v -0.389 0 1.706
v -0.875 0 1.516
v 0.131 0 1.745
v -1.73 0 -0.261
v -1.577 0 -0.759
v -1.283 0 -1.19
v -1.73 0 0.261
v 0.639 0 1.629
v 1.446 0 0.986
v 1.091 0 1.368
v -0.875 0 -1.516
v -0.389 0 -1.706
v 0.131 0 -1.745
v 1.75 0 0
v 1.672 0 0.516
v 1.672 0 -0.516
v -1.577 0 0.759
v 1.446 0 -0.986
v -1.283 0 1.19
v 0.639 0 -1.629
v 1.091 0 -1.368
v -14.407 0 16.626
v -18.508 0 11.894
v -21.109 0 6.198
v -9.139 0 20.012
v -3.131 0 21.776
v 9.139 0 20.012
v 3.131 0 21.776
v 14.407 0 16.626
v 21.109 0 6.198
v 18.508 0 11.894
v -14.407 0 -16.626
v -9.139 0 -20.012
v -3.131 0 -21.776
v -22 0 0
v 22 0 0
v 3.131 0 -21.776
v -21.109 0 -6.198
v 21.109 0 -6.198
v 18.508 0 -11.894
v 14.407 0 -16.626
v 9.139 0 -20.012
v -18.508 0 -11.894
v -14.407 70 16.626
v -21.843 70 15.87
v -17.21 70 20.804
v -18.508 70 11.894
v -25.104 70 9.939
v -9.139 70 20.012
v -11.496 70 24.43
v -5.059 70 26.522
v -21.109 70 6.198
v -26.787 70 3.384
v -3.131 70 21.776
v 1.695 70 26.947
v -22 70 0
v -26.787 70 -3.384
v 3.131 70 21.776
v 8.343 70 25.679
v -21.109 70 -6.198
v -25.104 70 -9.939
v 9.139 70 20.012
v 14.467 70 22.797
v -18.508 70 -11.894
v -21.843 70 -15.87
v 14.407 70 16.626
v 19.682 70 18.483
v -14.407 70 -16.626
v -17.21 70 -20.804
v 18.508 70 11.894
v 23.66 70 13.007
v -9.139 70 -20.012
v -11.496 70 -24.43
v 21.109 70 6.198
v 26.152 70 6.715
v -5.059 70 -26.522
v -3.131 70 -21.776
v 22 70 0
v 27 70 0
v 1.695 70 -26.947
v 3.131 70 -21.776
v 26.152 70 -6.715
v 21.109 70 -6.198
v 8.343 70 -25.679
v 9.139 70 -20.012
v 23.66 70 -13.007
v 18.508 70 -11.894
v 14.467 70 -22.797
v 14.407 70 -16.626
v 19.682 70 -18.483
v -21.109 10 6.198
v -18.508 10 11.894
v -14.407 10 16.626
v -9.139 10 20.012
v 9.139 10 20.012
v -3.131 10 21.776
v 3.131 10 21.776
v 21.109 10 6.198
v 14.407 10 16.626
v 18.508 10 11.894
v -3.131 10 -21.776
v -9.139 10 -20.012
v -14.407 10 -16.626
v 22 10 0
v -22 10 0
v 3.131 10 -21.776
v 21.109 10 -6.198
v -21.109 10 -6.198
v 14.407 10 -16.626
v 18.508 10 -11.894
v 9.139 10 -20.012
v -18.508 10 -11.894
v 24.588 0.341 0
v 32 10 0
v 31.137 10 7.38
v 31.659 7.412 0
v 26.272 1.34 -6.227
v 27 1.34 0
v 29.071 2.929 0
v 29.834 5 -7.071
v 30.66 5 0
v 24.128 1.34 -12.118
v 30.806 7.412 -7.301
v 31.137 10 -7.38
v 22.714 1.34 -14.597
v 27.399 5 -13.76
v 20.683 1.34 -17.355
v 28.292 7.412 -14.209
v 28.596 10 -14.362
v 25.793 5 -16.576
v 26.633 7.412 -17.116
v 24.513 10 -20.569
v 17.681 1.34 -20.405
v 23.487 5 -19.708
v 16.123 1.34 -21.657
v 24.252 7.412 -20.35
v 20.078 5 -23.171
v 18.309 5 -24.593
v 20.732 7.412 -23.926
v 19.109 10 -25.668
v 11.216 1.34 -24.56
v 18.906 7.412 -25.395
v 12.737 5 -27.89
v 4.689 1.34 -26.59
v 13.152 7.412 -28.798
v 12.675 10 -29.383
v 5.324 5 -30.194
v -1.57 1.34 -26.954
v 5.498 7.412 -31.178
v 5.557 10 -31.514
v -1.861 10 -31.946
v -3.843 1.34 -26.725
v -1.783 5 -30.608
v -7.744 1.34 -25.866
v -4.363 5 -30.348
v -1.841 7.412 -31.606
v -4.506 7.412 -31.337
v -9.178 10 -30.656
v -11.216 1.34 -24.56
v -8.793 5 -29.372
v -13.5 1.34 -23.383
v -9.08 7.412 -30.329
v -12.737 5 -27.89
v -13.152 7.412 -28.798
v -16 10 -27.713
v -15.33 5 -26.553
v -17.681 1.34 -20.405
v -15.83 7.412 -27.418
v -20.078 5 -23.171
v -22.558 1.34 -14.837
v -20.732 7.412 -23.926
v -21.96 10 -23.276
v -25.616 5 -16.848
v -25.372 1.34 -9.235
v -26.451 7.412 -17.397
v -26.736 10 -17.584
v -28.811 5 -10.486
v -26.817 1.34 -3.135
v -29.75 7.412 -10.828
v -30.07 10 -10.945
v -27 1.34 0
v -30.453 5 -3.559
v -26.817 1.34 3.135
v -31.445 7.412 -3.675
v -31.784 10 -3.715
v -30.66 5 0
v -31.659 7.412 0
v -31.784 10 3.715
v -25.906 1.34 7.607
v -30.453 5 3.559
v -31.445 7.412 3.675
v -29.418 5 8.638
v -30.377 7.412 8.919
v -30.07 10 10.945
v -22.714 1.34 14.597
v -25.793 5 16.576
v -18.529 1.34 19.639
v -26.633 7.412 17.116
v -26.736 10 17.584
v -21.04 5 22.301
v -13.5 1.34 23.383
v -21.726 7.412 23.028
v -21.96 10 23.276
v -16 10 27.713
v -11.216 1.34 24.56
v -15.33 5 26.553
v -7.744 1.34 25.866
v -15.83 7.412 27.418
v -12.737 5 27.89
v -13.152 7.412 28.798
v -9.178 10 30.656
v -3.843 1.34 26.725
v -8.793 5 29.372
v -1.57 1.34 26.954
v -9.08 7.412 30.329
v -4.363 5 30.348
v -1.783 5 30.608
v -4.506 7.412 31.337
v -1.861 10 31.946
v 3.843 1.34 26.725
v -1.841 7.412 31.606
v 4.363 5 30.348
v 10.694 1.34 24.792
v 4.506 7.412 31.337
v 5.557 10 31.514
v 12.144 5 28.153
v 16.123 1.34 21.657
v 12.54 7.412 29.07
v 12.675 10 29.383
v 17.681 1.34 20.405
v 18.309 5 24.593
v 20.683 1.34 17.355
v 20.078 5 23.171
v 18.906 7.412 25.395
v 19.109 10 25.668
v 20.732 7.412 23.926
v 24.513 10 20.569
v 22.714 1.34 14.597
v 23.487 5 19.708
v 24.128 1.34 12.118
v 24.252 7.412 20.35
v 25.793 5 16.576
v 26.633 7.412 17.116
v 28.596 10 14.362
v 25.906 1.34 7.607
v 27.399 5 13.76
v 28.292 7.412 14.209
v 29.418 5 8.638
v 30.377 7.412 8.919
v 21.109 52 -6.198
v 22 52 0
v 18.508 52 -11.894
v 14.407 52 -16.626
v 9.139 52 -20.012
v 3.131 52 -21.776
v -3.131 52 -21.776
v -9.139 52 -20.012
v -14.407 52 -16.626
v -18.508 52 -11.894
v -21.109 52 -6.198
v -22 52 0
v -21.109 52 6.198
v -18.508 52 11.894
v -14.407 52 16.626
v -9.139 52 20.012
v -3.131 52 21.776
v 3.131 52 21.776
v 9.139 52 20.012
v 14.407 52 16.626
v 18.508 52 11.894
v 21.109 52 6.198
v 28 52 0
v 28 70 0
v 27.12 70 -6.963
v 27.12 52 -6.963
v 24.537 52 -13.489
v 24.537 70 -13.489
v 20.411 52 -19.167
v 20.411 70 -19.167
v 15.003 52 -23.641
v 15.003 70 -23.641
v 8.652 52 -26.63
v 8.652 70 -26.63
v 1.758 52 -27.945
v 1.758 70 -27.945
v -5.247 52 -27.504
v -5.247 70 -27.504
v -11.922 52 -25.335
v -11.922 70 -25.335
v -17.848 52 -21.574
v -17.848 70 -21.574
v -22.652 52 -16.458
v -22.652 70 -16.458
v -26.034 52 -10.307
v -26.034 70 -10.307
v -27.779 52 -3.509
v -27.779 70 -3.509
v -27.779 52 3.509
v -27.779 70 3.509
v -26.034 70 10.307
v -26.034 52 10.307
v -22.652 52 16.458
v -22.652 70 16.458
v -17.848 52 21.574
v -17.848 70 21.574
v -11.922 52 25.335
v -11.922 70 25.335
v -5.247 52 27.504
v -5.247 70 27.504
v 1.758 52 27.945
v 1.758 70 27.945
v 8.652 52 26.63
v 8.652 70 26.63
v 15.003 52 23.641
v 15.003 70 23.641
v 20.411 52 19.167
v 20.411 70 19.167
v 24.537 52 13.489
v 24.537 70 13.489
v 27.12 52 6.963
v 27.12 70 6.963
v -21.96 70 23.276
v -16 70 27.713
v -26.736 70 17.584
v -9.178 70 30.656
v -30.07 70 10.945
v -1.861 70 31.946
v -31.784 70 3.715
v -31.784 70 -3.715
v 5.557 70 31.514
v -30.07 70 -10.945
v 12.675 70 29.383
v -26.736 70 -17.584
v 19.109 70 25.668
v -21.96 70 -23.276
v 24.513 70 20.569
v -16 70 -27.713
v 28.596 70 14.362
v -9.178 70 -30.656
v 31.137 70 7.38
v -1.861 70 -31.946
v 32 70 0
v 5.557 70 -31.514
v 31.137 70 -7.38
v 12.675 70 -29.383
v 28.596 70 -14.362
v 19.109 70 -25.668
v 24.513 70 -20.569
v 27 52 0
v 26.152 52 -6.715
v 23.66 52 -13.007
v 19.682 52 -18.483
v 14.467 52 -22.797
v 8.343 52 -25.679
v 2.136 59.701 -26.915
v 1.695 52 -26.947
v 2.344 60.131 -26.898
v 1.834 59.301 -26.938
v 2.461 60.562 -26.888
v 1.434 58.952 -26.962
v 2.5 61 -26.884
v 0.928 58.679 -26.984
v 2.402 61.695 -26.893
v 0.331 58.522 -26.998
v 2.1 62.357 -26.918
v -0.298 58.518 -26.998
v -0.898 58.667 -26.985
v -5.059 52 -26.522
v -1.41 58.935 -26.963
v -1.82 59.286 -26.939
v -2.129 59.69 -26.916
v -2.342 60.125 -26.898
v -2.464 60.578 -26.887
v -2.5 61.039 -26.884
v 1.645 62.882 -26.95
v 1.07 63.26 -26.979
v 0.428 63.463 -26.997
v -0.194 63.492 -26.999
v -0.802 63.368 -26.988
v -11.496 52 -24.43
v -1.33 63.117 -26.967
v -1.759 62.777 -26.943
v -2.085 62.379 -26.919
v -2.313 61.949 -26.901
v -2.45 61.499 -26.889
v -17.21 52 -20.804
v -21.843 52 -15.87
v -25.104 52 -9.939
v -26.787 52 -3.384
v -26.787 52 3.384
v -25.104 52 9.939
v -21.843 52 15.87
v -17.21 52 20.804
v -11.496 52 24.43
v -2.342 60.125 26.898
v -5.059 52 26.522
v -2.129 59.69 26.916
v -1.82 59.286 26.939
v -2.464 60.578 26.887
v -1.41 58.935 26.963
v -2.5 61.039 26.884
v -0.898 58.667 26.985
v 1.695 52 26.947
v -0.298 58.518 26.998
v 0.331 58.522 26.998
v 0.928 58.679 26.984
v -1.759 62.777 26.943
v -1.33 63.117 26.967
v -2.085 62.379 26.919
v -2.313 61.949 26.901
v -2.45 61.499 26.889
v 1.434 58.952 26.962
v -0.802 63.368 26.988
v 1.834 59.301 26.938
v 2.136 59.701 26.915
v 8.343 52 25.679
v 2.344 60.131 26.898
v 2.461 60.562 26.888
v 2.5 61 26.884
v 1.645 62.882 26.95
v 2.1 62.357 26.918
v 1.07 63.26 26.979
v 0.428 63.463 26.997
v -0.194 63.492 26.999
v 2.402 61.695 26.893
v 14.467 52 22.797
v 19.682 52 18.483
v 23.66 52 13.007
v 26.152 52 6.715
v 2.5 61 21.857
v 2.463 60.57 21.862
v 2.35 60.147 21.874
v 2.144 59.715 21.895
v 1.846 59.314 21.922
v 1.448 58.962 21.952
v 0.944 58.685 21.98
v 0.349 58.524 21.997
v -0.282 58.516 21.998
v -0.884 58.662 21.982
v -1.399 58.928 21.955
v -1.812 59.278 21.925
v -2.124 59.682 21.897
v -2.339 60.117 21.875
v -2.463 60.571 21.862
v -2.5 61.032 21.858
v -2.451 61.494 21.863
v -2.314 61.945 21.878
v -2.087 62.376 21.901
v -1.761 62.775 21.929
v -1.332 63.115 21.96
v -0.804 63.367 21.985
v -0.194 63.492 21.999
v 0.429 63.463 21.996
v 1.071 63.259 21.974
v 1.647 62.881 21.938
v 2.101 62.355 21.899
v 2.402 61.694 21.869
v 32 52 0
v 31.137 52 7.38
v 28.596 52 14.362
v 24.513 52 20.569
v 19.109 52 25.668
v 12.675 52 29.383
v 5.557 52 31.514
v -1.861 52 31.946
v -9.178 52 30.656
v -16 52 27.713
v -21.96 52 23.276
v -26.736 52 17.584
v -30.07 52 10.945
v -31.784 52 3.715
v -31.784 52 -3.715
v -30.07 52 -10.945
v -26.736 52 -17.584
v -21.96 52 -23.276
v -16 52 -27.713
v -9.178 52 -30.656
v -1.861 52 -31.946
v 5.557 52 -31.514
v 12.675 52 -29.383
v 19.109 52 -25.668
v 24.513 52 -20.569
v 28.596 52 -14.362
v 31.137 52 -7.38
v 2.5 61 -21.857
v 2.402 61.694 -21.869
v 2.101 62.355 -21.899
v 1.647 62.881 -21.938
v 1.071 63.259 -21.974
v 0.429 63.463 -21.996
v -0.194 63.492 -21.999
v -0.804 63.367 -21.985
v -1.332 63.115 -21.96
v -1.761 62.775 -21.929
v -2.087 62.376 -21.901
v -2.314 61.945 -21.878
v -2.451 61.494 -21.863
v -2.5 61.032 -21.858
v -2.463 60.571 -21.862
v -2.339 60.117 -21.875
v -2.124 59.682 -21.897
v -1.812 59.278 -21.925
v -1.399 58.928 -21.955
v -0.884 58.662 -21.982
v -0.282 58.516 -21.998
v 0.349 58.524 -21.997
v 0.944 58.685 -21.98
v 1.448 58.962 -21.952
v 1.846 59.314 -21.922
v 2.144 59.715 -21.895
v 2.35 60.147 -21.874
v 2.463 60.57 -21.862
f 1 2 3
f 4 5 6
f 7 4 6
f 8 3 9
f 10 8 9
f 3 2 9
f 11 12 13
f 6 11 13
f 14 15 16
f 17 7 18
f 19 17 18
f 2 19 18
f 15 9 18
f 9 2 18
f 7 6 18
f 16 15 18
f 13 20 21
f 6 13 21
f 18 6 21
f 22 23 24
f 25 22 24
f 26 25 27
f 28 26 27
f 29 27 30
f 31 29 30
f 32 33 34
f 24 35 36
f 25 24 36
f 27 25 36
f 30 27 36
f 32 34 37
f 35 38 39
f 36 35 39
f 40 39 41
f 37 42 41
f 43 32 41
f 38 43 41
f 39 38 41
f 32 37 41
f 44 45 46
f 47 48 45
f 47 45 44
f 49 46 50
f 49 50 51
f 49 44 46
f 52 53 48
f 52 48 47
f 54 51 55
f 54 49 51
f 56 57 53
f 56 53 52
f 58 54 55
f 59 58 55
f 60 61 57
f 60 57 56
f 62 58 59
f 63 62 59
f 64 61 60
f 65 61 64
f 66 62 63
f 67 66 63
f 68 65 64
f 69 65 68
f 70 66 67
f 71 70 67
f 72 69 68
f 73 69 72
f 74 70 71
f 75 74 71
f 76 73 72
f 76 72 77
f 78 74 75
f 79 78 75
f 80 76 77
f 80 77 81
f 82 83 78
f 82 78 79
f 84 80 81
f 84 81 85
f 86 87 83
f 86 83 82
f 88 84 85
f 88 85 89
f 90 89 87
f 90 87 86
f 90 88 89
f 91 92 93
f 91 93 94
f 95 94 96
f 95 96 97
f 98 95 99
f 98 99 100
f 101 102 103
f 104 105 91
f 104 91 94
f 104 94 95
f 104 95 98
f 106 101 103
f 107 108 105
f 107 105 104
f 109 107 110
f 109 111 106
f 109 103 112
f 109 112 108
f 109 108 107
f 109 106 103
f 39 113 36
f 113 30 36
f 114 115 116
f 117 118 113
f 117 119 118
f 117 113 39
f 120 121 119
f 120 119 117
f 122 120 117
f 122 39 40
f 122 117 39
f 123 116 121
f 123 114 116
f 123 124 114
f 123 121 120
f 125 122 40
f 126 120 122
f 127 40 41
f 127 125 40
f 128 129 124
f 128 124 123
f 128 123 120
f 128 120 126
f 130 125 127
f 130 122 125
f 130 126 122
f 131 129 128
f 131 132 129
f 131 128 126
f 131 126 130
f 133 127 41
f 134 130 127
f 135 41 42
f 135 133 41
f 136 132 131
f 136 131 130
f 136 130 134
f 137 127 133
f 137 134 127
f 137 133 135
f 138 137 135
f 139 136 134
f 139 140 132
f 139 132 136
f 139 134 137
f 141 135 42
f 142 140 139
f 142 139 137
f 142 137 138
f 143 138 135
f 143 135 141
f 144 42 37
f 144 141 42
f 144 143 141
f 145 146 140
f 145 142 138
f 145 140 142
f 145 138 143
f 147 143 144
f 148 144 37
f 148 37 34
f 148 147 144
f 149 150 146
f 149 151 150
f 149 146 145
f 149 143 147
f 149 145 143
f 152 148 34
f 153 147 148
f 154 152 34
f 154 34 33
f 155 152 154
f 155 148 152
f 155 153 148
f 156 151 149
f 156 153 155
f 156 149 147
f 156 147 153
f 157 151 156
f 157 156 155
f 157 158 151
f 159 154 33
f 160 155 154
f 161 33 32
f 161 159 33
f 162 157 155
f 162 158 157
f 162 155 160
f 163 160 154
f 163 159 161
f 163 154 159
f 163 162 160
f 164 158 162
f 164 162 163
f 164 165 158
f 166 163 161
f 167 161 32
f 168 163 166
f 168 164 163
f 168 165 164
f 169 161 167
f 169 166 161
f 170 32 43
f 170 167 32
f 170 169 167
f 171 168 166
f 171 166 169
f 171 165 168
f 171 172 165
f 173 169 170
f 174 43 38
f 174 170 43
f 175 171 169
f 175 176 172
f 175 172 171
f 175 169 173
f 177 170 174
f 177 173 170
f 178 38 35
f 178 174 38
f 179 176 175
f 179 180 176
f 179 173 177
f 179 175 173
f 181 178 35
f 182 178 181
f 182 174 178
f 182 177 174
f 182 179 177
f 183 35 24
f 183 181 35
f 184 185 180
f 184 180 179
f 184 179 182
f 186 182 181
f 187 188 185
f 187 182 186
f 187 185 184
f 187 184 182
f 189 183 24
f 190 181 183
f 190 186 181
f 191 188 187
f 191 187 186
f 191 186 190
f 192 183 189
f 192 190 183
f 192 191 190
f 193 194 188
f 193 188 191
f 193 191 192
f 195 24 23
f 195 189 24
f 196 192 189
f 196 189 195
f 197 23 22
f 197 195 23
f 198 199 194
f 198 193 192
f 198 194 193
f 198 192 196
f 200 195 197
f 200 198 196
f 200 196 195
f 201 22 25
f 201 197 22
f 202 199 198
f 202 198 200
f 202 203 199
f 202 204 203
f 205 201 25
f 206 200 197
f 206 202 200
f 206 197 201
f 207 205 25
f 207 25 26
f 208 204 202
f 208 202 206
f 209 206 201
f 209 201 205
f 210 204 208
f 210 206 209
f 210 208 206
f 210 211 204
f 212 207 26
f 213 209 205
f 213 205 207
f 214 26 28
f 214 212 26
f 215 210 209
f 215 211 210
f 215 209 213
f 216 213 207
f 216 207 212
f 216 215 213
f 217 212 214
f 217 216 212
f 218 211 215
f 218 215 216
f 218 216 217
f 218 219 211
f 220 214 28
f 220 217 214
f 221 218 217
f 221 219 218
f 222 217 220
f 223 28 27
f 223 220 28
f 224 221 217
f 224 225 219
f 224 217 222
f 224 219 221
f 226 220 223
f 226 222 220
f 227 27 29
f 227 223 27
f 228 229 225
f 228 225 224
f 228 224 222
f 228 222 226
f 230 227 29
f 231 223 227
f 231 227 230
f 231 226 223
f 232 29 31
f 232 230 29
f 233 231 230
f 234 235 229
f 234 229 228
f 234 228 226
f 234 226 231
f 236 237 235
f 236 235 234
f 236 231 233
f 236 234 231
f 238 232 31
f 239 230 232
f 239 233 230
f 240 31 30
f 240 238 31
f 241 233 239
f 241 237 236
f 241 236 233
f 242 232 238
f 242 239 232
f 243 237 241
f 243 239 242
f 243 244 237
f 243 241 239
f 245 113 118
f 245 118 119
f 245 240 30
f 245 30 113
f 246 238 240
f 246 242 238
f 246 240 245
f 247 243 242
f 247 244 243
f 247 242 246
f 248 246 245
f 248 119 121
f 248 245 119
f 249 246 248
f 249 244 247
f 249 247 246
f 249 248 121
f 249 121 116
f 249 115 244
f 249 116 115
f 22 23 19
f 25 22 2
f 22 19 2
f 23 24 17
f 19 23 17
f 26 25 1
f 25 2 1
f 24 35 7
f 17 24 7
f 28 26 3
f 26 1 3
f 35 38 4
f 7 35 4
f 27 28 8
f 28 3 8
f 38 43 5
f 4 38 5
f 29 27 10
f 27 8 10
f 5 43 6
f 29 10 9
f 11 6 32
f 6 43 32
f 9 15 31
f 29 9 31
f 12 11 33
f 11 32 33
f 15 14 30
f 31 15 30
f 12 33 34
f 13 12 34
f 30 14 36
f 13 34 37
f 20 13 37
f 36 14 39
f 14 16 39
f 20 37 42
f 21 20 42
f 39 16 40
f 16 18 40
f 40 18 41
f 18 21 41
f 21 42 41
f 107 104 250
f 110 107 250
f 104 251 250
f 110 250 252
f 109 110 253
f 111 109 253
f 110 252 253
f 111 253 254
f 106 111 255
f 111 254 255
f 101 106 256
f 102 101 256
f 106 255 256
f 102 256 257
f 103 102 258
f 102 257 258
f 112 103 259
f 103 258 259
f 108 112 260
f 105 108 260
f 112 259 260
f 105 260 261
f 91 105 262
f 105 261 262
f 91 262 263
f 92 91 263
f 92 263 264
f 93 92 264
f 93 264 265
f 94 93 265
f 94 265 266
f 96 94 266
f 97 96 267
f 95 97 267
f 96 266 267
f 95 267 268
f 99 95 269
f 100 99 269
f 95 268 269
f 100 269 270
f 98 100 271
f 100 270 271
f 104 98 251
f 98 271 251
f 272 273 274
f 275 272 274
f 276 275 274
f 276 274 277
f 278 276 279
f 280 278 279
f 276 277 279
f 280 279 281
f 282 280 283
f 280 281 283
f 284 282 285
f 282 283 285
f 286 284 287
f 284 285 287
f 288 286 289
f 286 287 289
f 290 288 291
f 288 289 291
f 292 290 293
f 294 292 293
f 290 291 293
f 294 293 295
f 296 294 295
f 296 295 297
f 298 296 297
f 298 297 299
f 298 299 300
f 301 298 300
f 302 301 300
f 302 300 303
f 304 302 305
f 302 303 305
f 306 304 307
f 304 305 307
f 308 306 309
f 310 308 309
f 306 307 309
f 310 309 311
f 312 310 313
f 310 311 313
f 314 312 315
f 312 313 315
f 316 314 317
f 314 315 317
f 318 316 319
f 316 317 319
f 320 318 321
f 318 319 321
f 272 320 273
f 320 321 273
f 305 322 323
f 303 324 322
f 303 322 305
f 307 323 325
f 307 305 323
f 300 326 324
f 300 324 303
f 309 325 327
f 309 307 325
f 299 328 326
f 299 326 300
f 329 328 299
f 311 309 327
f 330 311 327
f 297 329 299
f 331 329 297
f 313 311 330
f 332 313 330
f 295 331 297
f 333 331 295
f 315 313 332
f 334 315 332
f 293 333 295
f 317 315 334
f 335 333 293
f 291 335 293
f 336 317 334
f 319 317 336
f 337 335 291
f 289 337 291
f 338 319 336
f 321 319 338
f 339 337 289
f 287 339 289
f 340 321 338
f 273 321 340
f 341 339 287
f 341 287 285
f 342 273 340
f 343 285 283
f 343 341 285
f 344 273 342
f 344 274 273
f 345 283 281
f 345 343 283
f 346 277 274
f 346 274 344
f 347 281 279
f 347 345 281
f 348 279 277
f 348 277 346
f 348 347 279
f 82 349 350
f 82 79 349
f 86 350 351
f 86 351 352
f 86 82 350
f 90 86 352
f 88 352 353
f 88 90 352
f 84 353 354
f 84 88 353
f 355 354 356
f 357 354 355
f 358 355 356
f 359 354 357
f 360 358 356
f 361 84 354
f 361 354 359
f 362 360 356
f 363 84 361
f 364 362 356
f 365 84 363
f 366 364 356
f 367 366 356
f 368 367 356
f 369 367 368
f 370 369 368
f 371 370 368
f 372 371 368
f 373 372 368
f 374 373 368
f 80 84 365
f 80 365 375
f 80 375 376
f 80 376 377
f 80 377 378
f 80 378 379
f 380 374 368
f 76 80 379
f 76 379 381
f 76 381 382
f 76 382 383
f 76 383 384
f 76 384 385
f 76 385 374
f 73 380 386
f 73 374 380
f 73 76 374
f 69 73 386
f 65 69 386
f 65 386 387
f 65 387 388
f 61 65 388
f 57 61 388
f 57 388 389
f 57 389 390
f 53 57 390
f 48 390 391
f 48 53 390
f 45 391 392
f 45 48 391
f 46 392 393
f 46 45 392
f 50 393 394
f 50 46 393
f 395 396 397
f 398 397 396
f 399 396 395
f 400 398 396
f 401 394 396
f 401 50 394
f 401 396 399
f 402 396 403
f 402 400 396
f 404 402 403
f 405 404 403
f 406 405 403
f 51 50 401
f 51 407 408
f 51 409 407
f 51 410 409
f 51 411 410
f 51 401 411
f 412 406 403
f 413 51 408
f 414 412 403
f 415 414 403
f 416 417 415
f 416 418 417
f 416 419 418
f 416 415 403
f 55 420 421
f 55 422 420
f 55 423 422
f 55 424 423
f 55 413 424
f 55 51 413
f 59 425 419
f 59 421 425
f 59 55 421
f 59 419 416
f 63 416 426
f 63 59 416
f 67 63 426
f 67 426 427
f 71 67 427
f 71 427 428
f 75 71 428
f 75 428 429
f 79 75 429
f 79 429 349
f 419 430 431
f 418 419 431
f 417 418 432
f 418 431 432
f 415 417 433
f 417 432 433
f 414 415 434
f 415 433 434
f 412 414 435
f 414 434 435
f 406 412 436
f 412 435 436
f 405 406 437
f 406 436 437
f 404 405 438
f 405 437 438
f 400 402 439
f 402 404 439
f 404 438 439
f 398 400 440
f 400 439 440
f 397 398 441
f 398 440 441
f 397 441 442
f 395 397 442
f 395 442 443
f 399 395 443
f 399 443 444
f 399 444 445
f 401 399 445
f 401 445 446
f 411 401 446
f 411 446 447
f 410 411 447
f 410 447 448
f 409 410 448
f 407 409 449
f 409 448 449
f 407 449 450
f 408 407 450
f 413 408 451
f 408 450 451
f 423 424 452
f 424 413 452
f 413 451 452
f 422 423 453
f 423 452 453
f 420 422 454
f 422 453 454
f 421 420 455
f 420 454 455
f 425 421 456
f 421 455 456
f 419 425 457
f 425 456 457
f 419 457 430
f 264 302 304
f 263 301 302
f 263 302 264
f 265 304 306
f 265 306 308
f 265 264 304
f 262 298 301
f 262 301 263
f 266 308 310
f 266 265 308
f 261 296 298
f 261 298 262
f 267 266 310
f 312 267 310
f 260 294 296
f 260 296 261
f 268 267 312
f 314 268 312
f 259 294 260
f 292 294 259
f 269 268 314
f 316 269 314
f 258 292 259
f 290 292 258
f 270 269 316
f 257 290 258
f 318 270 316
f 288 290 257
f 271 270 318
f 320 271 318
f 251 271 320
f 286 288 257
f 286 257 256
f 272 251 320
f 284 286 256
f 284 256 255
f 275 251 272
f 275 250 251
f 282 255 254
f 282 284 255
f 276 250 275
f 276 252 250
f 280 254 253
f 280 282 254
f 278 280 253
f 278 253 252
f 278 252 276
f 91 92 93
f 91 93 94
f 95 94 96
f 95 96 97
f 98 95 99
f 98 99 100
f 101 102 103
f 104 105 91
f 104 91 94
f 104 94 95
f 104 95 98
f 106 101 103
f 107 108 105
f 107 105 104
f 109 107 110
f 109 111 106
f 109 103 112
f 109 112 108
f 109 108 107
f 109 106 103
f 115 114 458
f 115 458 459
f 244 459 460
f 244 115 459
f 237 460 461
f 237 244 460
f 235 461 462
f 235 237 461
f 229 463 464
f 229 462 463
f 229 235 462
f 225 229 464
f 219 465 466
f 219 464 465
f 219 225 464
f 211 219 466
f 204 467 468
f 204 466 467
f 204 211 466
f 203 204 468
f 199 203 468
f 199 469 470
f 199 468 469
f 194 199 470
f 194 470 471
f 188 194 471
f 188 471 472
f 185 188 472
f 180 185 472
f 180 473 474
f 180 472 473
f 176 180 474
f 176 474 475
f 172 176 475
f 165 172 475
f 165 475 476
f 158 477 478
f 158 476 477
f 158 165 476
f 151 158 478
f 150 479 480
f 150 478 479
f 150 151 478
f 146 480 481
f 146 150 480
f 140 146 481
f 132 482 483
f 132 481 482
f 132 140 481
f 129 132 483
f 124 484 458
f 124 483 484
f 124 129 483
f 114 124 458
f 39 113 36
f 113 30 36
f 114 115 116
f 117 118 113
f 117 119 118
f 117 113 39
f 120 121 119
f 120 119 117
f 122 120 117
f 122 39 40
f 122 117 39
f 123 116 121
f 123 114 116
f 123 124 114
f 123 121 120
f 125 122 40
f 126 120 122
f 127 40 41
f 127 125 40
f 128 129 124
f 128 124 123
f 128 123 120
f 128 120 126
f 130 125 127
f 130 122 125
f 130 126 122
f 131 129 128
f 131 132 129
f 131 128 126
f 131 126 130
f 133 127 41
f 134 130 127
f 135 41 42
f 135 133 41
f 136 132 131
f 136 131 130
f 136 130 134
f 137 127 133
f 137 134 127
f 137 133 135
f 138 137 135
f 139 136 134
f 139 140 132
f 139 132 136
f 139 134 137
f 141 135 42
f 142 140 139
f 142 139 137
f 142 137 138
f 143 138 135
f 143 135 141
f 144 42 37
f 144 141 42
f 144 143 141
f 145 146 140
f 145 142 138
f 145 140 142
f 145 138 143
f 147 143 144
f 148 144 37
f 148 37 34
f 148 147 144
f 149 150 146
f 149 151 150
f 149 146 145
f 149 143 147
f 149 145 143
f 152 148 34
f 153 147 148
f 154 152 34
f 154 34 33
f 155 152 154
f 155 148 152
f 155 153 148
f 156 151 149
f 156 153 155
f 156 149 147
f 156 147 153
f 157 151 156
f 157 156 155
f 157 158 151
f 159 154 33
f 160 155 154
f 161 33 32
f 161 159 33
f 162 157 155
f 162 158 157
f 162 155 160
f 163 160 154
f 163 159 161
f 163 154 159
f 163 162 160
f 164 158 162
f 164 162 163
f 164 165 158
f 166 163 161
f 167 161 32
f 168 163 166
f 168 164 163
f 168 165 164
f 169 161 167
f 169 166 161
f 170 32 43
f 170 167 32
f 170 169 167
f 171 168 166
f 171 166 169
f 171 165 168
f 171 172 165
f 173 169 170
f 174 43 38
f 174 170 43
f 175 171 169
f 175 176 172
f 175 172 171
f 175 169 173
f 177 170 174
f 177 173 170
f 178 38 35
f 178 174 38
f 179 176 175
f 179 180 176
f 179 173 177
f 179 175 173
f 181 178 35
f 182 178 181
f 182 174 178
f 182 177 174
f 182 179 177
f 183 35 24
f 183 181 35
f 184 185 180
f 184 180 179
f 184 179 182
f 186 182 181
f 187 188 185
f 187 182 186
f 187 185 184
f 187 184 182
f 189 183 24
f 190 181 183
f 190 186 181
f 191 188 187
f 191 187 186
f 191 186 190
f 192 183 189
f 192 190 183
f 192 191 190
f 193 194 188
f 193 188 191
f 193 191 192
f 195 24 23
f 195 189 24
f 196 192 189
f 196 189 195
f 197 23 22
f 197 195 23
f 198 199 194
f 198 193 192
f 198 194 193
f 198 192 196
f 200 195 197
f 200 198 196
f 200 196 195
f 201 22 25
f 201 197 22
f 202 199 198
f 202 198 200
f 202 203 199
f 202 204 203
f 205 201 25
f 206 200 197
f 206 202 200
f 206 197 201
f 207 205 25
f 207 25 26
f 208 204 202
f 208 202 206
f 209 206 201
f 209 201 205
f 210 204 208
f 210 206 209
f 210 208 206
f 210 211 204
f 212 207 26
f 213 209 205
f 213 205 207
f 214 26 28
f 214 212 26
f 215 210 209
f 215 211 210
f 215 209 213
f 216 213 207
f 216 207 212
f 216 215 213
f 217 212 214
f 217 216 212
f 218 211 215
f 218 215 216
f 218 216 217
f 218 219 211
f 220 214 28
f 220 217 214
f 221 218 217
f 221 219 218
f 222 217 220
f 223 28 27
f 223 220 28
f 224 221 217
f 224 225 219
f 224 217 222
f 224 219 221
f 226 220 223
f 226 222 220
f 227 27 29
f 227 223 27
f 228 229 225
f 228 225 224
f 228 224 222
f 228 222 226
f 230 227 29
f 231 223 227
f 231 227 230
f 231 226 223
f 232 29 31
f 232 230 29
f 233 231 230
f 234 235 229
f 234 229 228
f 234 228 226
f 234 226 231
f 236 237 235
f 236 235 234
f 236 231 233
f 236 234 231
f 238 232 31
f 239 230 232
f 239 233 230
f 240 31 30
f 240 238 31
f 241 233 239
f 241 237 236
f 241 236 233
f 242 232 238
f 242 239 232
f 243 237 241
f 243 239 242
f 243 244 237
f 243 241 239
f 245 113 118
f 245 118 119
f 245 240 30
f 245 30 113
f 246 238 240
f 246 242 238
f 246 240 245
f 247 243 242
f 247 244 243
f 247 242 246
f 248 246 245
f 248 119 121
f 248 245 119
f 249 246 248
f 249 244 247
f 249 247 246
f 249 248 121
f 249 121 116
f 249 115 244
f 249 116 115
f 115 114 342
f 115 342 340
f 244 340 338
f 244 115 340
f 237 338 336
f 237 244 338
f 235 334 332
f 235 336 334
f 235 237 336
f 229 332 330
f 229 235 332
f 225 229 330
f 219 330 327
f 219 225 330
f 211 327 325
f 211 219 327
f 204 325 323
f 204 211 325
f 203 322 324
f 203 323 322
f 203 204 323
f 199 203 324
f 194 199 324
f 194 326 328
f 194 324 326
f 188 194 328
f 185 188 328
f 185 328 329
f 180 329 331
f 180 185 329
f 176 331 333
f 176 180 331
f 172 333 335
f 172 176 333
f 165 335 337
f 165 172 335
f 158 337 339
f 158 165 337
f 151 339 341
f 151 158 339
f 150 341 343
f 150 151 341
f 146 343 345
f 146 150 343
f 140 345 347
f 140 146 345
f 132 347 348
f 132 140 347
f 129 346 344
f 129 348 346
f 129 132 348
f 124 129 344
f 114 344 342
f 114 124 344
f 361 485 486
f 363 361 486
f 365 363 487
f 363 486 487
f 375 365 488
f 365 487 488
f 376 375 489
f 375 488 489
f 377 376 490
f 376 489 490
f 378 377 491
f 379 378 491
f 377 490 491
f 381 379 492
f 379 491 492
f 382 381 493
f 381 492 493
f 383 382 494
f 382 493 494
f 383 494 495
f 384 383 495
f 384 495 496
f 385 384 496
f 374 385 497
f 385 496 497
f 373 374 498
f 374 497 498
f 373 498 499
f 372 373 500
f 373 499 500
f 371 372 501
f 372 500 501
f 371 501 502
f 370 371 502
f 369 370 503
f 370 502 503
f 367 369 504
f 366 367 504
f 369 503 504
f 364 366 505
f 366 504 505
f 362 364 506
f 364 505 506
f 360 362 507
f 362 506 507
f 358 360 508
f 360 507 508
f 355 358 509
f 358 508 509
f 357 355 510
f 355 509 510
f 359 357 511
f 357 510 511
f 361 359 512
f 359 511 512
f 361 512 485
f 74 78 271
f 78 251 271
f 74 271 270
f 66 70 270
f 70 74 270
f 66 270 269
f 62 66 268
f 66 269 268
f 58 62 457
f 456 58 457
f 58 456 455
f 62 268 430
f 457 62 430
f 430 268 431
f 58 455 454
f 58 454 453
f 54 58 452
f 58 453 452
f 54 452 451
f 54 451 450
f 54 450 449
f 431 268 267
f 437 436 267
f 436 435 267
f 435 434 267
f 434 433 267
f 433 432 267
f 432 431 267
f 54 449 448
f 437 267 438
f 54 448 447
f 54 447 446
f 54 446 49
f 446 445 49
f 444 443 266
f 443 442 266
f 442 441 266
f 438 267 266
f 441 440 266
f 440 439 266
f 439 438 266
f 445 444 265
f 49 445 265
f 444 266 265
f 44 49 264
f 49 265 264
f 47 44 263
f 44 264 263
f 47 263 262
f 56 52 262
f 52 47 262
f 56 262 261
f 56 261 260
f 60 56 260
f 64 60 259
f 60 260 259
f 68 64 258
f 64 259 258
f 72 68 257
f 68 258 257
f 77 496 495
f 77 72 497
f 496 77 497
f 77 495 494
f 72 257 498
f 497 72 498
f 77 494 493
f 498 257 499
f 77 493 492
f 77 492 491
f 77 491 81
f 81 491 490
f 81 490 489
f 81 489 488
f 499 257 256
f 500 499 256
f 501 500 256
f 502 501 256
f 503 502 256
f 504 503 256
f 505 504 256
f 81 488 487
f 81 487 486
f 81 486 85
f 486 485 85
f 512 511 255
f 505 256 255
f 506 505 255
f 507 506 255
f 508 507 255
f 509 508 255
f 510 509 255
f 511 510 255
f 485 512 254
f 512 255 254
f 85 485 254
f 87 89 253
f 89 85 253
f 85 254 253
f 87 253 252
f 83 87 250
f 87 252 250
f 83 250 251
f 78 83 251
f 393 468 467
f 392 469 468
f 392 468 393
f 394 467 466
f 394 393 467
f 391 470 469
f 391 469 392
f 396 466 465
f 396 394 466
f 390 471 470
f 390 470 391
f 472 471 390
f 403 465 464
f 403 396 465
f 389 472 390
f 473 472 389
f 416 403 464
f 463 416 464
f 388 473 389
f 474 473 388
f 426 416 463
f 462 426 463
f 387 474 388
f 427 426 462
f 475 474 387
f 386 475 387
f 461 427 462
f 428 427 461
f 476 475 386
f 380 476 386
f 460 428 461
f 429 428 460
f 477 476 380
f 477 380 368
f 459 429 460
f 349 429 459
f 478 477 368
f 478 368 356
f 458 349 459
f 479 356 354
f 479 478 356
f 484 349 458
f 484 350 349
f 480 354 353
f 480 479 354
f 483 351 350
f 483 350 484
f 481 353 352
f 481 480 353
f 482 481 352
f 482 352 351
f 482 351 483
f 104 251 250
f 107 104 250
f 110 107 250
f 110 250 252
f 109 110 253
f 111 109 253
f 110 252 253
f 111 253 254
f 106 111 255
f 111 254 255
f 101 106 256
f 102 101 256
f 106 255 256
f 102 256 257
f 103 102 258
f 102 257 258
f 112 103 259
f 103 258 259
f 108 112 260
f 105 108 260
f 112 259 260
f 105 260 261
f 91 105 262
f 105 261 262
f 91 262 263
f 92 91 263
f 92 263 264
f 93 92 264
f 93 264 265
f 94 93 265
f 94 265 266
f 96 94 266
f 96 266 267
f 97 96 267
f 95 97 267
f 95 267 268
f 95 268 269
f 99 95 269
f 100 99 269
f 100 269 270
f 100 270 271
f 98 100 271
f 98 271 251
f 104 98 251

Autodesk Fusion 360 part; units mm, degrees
sketch "Sketch1" plane through (0, 0, 0) normal (0, 0, 1) x (1, 0, 0) in component "Top Projectile"
  line L0 (13.7981, 10) -> (11.1635, 10)
  line L1 (22, 52) -> (32, 52)
  line L2 (32, 52) -> (32, 10)
  line L3 (32, 10) -> (22, 10)
  line L4 (22, 10) -> (22, 52)
  line L5 (27, 70) -> (22, 70)
  line L6 (22, 70) -> (22, 52)
  line L7 (22, 52) -> (27, 52)
  line L8 (27, 52) -> (27, 70)
  line L9 (0, 5.0221) -> (0, 0)
  line L10 (22, 10) -> (0, 10)
  line L11 (0, 10) -> (0, 0)
  line L12 (1.75, 0) -> (22.5, 0)
  line L13 (0, 0) -> (22, 0)
  arc A0 (22, 0) -> (32, 10) centre (22, 10) ccw
  circle A1 centre (0, 61) radius 2.5
  point P0 (32, 10)
  point P1 (22, 52)
  point P2 (27, 70)
  point P3 (0, 5.0221)
  dimension "d21" = 18
  dimension "d22" = 5
  dimension "d23" = 10
  dimension "d24" = 32
  dimension "d27" = 10
  dimension "d29" = 42
  dimension "d30" = 22
  dimension "d48" = 9
  dimension "d49" = 5
  dimension "d52" = 32
revolve "Revolve1" add sketch "Sketch1" angle 360 about axis through (0, 1.75, 0) along (0, 1, 0) contours L0 L3 L9 L10 L11 L12 L13 A0 | L1 L2 L3 L4 L7 | L1 L5 L6 L7 L8 makes body 1 in component "Top Projectile"
sketch "Sketch1 (2)" plane through (0, 0, 0) normal (0, 0, 1) x (1, 0, 0) in component "Bottom Projectile"
  line L0 (1.75, 0) -> (22.5, 0)
  line L1 (22, 52) -> (27, 52)
  line L2 (32, 10) -> (22, 10)
  line L3 (22, 10) -> (0, 10)
  line L4 (32, 52) -> (32, 10)
  arc A0 (22, 0) -> (32, 10) centre (22, 10) ccw
  line L5 (22, 10) -> (22, 52)
  line L6 (0, 19.0221) -> (0, 0)
  line L7 (13.7981, 10) -> (11.1635, 10)
  line L8 (22, 52) -> (32, 52)
  line L9 (0, 0) -> (22, 0)
  line L10 (0, 10) -> (0, 0)
  line L11 (28, 70) -> (32, 70)
  line L12 (32, 70) -> (32, 52)
  line L13 (32, 52) -> (28, 52)
  line L14 (28, 52) -> (28, 70)
  circle A1 centre (0, 61) radius 2.5
  line L15 (0, 1.75) -> (0, 22.5)
  line L16 (1.75, 0) -> (22.5, 0)
  point P0 (0, 19.0221)
  point P1 (22, 52)
  point P2 (32, 10)
  point P3 (28, 70)
  dimension "d41" = 10
  dimension "d42" = 32
  dimension "d43" = 10
  dimension "d44" = 42
  dimension "d45" = 22
  dimension "d46" = 6
  dimension "d47" = 18
  dimension "d56" = 5
  dimension "d57" = 32
  dimension "d58" = 9
revolve "Revolve1'" add sketch "Sketch1 (2)" angle 360 about axis through (0, 1.75, 0) along (0, 1, 0) separate body contours L0 L2 L3 A0 L6 L7 L9 L10 L15 L16 | L1 L2 L4 L5 L8 L13 | L8 L11 L12 L13 L14 makes body 2 in component "Bottom Projectile"
extrude "Extrude1" cut sketch "Sketch1" along normal through all and the other way through all contours A1 bodies 1 in component "Top Projectile"
extrude "Extrude1'" cut sketch "Sketch1" along normal through all and the other way through all contours A1 bodies 2 in component "Bottom Projectile"
component "Top Projectile" placed x (1, 0, 0) y (0, 1, 0) z (0, 0, 1) at (0, 0, 0)
component "Bottom Projectile" placed x (1, 0, 0) y (0, 1, 0) z (0, 0, 1) at (0, 0, 0)
equation "WallThickness = 10 mm" comment "Thickness of the projectile Wall"
equation "WallLength = 120 mm" comment "Length of the wall, not including the caps"
equation "d21 = WallLength * ( 3 / 10 ) * ( 1 / 2 )"
equation "d22 = WallThickness / 2"
equation "d23 = WallThickness"
equation "d24 = OutterRadius"
equation "OutterRadius = 32 mm"
equation "d27 = CapThickness"
equation "d29 = WallLength * ( 7 / 10 ) * ( 1 / 2 )"
equation "d30 = OutterRadius - WallThickness"
equation "CapThickness = 10 mm" comment "Thickness of the end caps"
equation "d41 = WallThickness"
equation "d42 = OutterRadius"
equation "d43 = CapThickness"
equation "d44 = WallLength * ( 7 / 10 ) * ( 1 / 2 )"
equation "d45 = OutterRadius - WallThickness"
equation "d46 = ( WallThickness / 2 ) + 1 mm"
equation "d47 = WallLength * ( 3 / 10 ) * ( 1 / 2 )"
equation "d48 = WallLength * ( 3 / 10 ) * ( 1 / 4 )"
equation "d49 = InsertDiameter"
equation "InsertDiameter = 5 mm" comment "Diameter of the metal insert"
equation "d52 = OutterRadius"
equation "d56 = InsertDiameter"
equation "d57 = OutterRadius"
equation "d58 = WallLength * ( 3 / 10 ) * ( 1 / 4 )"
